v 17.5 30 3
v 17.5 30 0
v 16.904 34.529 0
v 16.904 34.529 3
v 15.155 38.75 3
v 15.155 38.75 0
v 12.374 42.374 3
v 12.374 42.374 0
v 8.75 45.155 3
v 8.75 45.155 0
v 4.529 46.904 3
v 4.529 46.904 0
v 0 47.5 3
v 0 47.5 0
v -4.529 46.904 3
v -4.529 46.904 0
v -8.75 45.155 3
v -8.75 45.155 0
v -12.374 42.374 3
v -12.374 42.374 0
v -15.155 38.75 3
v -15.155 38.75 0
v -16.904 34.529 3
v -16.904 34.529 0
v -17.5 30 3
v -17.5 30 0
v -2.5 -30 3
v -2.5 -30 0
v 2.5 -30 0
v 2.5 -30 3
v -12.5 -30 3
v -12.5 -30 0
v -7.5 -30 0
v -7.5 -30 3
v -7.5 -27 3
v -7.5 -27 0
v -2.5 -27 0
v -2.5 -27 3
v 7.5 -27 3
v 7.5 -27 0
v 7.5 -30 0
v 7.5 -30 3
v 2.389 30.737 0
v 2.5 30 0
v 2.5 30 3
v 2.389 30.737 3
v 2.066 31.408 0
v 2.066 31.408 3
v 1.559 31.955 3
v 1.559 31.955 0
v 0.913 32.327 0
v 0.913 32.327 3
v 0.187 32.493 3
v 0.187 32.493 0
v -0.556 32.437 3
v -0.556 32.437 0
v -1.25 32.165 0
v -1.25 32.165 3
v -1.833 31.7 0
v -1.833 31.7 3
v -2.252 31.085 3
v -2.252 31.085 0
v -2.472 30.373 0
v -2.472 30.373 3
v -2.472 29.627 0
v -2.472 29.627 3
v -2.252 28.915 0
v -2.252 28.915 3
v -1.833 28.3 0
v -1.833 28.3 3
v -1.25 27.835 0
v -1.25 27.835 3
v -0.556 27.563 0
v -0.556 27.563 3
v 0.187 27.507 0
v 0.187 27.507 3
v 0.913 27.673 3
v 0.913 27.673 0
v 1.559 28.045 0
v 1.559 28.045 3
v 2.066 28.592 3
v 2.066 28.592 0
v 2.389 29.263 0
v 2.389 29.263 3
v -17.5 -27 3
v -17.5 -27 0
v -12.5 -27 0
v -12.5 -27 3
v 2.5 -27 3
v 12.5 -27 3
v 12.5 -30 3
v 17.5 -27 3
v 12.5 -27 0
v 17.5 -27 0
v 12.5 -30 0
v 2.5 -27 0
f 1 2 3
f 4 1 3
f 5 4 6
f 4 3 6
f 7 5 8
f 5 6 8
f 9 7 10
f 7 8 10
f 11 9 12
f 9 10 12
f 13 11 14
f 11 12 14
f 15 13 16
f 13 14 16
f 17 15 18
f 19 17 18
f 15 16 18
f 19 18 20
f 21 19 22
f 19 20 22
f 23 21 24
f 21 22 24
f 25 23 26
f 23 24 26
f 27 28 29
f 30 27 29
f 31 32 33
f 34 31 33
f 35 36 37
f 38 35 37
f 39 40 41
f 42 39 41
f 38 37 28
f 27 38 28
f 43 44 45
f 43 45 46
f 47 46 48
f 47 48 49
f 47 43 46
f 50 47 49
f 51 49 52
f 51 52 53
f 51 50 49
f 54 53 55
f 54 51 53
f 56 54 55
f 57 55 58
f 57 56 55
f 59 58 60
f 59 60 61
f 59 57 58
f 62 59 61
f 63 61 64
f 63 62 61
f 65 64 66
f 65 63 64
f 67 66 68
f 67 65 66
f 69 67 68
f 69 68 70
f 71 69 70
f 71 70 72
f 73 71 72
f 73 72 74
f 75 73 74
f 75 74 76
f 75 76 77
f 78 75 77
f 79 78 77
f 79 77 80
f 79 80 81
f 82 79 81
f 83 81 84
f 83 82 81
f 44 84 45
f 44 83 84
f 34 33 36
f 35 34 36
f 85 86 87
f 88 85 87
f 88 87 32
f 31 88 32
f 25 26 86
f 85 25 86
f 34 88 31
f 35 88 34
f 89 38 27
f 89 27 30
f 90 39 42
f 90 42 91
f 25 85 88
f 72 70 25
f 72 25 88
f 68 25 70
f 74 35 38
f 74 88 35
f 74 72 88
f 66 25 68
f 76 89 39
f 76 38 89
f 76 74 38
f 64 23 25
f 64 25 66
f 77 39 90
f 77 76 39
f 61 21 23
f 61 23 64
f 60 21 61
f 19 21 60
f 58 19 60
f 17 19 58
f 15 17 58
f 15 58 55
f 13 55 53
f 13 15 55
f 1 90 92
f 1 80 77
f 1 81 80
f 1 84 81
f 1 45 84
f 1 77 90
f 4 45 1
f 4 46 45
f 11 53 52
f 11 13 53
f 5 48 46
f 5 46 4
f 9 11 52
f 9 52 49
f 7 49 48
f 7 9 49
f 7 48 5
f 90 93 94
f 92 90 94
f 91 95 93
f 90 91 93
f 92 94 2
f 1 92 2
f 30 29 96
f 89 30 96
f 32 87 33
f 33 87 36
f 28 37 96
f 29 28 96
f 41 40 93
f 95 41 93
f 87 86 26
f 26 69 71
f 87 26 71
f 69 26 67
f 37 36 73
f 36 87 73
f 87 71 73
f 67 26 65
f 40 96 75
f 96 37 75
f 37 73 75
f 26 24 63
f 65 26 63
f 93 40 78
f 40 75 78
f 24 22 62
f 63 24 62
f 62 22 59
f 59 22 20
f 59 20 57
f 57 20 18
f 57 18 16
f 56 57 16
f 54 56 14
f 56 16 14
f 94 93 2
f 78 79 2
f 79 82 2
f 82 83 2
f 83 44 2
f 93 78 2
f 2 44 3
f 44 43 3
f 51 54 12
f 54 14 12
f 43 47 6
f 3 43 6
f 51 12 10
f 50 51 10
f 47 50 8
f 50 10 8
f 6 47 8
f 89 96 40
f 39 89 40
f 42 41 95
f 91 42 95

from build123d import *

# Parameters (mm, degrees)
CROQUIS1_R              = 2.5
SALIENTE_EXTRUIR1_DEPTH = 3


with BuildPart() as part:
    # Croquis1 → Saliente-Extruir1 (new body)
    with BuildSketch(Plane.XY):
        with BuildLine():
            Line((-12.5, -30), (-7.5, -30))
            Line((-7.5, -30), (-7.5, -27))
            Line((-7.5, -27), (-2.5, -27))
            Line((-2.5, -27), (-2.5, -30))
            Line((-2.5, -30), (2.5, -30))
            Line((2.5, -30), (2.5, -27))
            Line((2.5, -27), (7.5, -27))
            Line((7.5, -27), (7.5, -30))
            Line((7.5, -30), (12.5, -30))
            Line((12.5, -30), (12.5, -27))
            Line((12.5, -27), (17.5, -27))
            Line((17.5, -27), (17.5, 30))
            ThreePointArc((17.5, 30), (0, 47.5), (-17.5, 30))
            Line((-17.5, 30), (-17.5, -27))
            Line((-17.5, -27), (-12.5, -27))
            Line((-12.5, -27), (-12.5, -30))
        make_face()
        with Locations((0, 30)):
            Circle(CROQUIS1_R, mode=Mode.SUBTRACT)
    extrude(amount=SALIENTE_EXTRUIR1_DEPTH)


solid = part.part
